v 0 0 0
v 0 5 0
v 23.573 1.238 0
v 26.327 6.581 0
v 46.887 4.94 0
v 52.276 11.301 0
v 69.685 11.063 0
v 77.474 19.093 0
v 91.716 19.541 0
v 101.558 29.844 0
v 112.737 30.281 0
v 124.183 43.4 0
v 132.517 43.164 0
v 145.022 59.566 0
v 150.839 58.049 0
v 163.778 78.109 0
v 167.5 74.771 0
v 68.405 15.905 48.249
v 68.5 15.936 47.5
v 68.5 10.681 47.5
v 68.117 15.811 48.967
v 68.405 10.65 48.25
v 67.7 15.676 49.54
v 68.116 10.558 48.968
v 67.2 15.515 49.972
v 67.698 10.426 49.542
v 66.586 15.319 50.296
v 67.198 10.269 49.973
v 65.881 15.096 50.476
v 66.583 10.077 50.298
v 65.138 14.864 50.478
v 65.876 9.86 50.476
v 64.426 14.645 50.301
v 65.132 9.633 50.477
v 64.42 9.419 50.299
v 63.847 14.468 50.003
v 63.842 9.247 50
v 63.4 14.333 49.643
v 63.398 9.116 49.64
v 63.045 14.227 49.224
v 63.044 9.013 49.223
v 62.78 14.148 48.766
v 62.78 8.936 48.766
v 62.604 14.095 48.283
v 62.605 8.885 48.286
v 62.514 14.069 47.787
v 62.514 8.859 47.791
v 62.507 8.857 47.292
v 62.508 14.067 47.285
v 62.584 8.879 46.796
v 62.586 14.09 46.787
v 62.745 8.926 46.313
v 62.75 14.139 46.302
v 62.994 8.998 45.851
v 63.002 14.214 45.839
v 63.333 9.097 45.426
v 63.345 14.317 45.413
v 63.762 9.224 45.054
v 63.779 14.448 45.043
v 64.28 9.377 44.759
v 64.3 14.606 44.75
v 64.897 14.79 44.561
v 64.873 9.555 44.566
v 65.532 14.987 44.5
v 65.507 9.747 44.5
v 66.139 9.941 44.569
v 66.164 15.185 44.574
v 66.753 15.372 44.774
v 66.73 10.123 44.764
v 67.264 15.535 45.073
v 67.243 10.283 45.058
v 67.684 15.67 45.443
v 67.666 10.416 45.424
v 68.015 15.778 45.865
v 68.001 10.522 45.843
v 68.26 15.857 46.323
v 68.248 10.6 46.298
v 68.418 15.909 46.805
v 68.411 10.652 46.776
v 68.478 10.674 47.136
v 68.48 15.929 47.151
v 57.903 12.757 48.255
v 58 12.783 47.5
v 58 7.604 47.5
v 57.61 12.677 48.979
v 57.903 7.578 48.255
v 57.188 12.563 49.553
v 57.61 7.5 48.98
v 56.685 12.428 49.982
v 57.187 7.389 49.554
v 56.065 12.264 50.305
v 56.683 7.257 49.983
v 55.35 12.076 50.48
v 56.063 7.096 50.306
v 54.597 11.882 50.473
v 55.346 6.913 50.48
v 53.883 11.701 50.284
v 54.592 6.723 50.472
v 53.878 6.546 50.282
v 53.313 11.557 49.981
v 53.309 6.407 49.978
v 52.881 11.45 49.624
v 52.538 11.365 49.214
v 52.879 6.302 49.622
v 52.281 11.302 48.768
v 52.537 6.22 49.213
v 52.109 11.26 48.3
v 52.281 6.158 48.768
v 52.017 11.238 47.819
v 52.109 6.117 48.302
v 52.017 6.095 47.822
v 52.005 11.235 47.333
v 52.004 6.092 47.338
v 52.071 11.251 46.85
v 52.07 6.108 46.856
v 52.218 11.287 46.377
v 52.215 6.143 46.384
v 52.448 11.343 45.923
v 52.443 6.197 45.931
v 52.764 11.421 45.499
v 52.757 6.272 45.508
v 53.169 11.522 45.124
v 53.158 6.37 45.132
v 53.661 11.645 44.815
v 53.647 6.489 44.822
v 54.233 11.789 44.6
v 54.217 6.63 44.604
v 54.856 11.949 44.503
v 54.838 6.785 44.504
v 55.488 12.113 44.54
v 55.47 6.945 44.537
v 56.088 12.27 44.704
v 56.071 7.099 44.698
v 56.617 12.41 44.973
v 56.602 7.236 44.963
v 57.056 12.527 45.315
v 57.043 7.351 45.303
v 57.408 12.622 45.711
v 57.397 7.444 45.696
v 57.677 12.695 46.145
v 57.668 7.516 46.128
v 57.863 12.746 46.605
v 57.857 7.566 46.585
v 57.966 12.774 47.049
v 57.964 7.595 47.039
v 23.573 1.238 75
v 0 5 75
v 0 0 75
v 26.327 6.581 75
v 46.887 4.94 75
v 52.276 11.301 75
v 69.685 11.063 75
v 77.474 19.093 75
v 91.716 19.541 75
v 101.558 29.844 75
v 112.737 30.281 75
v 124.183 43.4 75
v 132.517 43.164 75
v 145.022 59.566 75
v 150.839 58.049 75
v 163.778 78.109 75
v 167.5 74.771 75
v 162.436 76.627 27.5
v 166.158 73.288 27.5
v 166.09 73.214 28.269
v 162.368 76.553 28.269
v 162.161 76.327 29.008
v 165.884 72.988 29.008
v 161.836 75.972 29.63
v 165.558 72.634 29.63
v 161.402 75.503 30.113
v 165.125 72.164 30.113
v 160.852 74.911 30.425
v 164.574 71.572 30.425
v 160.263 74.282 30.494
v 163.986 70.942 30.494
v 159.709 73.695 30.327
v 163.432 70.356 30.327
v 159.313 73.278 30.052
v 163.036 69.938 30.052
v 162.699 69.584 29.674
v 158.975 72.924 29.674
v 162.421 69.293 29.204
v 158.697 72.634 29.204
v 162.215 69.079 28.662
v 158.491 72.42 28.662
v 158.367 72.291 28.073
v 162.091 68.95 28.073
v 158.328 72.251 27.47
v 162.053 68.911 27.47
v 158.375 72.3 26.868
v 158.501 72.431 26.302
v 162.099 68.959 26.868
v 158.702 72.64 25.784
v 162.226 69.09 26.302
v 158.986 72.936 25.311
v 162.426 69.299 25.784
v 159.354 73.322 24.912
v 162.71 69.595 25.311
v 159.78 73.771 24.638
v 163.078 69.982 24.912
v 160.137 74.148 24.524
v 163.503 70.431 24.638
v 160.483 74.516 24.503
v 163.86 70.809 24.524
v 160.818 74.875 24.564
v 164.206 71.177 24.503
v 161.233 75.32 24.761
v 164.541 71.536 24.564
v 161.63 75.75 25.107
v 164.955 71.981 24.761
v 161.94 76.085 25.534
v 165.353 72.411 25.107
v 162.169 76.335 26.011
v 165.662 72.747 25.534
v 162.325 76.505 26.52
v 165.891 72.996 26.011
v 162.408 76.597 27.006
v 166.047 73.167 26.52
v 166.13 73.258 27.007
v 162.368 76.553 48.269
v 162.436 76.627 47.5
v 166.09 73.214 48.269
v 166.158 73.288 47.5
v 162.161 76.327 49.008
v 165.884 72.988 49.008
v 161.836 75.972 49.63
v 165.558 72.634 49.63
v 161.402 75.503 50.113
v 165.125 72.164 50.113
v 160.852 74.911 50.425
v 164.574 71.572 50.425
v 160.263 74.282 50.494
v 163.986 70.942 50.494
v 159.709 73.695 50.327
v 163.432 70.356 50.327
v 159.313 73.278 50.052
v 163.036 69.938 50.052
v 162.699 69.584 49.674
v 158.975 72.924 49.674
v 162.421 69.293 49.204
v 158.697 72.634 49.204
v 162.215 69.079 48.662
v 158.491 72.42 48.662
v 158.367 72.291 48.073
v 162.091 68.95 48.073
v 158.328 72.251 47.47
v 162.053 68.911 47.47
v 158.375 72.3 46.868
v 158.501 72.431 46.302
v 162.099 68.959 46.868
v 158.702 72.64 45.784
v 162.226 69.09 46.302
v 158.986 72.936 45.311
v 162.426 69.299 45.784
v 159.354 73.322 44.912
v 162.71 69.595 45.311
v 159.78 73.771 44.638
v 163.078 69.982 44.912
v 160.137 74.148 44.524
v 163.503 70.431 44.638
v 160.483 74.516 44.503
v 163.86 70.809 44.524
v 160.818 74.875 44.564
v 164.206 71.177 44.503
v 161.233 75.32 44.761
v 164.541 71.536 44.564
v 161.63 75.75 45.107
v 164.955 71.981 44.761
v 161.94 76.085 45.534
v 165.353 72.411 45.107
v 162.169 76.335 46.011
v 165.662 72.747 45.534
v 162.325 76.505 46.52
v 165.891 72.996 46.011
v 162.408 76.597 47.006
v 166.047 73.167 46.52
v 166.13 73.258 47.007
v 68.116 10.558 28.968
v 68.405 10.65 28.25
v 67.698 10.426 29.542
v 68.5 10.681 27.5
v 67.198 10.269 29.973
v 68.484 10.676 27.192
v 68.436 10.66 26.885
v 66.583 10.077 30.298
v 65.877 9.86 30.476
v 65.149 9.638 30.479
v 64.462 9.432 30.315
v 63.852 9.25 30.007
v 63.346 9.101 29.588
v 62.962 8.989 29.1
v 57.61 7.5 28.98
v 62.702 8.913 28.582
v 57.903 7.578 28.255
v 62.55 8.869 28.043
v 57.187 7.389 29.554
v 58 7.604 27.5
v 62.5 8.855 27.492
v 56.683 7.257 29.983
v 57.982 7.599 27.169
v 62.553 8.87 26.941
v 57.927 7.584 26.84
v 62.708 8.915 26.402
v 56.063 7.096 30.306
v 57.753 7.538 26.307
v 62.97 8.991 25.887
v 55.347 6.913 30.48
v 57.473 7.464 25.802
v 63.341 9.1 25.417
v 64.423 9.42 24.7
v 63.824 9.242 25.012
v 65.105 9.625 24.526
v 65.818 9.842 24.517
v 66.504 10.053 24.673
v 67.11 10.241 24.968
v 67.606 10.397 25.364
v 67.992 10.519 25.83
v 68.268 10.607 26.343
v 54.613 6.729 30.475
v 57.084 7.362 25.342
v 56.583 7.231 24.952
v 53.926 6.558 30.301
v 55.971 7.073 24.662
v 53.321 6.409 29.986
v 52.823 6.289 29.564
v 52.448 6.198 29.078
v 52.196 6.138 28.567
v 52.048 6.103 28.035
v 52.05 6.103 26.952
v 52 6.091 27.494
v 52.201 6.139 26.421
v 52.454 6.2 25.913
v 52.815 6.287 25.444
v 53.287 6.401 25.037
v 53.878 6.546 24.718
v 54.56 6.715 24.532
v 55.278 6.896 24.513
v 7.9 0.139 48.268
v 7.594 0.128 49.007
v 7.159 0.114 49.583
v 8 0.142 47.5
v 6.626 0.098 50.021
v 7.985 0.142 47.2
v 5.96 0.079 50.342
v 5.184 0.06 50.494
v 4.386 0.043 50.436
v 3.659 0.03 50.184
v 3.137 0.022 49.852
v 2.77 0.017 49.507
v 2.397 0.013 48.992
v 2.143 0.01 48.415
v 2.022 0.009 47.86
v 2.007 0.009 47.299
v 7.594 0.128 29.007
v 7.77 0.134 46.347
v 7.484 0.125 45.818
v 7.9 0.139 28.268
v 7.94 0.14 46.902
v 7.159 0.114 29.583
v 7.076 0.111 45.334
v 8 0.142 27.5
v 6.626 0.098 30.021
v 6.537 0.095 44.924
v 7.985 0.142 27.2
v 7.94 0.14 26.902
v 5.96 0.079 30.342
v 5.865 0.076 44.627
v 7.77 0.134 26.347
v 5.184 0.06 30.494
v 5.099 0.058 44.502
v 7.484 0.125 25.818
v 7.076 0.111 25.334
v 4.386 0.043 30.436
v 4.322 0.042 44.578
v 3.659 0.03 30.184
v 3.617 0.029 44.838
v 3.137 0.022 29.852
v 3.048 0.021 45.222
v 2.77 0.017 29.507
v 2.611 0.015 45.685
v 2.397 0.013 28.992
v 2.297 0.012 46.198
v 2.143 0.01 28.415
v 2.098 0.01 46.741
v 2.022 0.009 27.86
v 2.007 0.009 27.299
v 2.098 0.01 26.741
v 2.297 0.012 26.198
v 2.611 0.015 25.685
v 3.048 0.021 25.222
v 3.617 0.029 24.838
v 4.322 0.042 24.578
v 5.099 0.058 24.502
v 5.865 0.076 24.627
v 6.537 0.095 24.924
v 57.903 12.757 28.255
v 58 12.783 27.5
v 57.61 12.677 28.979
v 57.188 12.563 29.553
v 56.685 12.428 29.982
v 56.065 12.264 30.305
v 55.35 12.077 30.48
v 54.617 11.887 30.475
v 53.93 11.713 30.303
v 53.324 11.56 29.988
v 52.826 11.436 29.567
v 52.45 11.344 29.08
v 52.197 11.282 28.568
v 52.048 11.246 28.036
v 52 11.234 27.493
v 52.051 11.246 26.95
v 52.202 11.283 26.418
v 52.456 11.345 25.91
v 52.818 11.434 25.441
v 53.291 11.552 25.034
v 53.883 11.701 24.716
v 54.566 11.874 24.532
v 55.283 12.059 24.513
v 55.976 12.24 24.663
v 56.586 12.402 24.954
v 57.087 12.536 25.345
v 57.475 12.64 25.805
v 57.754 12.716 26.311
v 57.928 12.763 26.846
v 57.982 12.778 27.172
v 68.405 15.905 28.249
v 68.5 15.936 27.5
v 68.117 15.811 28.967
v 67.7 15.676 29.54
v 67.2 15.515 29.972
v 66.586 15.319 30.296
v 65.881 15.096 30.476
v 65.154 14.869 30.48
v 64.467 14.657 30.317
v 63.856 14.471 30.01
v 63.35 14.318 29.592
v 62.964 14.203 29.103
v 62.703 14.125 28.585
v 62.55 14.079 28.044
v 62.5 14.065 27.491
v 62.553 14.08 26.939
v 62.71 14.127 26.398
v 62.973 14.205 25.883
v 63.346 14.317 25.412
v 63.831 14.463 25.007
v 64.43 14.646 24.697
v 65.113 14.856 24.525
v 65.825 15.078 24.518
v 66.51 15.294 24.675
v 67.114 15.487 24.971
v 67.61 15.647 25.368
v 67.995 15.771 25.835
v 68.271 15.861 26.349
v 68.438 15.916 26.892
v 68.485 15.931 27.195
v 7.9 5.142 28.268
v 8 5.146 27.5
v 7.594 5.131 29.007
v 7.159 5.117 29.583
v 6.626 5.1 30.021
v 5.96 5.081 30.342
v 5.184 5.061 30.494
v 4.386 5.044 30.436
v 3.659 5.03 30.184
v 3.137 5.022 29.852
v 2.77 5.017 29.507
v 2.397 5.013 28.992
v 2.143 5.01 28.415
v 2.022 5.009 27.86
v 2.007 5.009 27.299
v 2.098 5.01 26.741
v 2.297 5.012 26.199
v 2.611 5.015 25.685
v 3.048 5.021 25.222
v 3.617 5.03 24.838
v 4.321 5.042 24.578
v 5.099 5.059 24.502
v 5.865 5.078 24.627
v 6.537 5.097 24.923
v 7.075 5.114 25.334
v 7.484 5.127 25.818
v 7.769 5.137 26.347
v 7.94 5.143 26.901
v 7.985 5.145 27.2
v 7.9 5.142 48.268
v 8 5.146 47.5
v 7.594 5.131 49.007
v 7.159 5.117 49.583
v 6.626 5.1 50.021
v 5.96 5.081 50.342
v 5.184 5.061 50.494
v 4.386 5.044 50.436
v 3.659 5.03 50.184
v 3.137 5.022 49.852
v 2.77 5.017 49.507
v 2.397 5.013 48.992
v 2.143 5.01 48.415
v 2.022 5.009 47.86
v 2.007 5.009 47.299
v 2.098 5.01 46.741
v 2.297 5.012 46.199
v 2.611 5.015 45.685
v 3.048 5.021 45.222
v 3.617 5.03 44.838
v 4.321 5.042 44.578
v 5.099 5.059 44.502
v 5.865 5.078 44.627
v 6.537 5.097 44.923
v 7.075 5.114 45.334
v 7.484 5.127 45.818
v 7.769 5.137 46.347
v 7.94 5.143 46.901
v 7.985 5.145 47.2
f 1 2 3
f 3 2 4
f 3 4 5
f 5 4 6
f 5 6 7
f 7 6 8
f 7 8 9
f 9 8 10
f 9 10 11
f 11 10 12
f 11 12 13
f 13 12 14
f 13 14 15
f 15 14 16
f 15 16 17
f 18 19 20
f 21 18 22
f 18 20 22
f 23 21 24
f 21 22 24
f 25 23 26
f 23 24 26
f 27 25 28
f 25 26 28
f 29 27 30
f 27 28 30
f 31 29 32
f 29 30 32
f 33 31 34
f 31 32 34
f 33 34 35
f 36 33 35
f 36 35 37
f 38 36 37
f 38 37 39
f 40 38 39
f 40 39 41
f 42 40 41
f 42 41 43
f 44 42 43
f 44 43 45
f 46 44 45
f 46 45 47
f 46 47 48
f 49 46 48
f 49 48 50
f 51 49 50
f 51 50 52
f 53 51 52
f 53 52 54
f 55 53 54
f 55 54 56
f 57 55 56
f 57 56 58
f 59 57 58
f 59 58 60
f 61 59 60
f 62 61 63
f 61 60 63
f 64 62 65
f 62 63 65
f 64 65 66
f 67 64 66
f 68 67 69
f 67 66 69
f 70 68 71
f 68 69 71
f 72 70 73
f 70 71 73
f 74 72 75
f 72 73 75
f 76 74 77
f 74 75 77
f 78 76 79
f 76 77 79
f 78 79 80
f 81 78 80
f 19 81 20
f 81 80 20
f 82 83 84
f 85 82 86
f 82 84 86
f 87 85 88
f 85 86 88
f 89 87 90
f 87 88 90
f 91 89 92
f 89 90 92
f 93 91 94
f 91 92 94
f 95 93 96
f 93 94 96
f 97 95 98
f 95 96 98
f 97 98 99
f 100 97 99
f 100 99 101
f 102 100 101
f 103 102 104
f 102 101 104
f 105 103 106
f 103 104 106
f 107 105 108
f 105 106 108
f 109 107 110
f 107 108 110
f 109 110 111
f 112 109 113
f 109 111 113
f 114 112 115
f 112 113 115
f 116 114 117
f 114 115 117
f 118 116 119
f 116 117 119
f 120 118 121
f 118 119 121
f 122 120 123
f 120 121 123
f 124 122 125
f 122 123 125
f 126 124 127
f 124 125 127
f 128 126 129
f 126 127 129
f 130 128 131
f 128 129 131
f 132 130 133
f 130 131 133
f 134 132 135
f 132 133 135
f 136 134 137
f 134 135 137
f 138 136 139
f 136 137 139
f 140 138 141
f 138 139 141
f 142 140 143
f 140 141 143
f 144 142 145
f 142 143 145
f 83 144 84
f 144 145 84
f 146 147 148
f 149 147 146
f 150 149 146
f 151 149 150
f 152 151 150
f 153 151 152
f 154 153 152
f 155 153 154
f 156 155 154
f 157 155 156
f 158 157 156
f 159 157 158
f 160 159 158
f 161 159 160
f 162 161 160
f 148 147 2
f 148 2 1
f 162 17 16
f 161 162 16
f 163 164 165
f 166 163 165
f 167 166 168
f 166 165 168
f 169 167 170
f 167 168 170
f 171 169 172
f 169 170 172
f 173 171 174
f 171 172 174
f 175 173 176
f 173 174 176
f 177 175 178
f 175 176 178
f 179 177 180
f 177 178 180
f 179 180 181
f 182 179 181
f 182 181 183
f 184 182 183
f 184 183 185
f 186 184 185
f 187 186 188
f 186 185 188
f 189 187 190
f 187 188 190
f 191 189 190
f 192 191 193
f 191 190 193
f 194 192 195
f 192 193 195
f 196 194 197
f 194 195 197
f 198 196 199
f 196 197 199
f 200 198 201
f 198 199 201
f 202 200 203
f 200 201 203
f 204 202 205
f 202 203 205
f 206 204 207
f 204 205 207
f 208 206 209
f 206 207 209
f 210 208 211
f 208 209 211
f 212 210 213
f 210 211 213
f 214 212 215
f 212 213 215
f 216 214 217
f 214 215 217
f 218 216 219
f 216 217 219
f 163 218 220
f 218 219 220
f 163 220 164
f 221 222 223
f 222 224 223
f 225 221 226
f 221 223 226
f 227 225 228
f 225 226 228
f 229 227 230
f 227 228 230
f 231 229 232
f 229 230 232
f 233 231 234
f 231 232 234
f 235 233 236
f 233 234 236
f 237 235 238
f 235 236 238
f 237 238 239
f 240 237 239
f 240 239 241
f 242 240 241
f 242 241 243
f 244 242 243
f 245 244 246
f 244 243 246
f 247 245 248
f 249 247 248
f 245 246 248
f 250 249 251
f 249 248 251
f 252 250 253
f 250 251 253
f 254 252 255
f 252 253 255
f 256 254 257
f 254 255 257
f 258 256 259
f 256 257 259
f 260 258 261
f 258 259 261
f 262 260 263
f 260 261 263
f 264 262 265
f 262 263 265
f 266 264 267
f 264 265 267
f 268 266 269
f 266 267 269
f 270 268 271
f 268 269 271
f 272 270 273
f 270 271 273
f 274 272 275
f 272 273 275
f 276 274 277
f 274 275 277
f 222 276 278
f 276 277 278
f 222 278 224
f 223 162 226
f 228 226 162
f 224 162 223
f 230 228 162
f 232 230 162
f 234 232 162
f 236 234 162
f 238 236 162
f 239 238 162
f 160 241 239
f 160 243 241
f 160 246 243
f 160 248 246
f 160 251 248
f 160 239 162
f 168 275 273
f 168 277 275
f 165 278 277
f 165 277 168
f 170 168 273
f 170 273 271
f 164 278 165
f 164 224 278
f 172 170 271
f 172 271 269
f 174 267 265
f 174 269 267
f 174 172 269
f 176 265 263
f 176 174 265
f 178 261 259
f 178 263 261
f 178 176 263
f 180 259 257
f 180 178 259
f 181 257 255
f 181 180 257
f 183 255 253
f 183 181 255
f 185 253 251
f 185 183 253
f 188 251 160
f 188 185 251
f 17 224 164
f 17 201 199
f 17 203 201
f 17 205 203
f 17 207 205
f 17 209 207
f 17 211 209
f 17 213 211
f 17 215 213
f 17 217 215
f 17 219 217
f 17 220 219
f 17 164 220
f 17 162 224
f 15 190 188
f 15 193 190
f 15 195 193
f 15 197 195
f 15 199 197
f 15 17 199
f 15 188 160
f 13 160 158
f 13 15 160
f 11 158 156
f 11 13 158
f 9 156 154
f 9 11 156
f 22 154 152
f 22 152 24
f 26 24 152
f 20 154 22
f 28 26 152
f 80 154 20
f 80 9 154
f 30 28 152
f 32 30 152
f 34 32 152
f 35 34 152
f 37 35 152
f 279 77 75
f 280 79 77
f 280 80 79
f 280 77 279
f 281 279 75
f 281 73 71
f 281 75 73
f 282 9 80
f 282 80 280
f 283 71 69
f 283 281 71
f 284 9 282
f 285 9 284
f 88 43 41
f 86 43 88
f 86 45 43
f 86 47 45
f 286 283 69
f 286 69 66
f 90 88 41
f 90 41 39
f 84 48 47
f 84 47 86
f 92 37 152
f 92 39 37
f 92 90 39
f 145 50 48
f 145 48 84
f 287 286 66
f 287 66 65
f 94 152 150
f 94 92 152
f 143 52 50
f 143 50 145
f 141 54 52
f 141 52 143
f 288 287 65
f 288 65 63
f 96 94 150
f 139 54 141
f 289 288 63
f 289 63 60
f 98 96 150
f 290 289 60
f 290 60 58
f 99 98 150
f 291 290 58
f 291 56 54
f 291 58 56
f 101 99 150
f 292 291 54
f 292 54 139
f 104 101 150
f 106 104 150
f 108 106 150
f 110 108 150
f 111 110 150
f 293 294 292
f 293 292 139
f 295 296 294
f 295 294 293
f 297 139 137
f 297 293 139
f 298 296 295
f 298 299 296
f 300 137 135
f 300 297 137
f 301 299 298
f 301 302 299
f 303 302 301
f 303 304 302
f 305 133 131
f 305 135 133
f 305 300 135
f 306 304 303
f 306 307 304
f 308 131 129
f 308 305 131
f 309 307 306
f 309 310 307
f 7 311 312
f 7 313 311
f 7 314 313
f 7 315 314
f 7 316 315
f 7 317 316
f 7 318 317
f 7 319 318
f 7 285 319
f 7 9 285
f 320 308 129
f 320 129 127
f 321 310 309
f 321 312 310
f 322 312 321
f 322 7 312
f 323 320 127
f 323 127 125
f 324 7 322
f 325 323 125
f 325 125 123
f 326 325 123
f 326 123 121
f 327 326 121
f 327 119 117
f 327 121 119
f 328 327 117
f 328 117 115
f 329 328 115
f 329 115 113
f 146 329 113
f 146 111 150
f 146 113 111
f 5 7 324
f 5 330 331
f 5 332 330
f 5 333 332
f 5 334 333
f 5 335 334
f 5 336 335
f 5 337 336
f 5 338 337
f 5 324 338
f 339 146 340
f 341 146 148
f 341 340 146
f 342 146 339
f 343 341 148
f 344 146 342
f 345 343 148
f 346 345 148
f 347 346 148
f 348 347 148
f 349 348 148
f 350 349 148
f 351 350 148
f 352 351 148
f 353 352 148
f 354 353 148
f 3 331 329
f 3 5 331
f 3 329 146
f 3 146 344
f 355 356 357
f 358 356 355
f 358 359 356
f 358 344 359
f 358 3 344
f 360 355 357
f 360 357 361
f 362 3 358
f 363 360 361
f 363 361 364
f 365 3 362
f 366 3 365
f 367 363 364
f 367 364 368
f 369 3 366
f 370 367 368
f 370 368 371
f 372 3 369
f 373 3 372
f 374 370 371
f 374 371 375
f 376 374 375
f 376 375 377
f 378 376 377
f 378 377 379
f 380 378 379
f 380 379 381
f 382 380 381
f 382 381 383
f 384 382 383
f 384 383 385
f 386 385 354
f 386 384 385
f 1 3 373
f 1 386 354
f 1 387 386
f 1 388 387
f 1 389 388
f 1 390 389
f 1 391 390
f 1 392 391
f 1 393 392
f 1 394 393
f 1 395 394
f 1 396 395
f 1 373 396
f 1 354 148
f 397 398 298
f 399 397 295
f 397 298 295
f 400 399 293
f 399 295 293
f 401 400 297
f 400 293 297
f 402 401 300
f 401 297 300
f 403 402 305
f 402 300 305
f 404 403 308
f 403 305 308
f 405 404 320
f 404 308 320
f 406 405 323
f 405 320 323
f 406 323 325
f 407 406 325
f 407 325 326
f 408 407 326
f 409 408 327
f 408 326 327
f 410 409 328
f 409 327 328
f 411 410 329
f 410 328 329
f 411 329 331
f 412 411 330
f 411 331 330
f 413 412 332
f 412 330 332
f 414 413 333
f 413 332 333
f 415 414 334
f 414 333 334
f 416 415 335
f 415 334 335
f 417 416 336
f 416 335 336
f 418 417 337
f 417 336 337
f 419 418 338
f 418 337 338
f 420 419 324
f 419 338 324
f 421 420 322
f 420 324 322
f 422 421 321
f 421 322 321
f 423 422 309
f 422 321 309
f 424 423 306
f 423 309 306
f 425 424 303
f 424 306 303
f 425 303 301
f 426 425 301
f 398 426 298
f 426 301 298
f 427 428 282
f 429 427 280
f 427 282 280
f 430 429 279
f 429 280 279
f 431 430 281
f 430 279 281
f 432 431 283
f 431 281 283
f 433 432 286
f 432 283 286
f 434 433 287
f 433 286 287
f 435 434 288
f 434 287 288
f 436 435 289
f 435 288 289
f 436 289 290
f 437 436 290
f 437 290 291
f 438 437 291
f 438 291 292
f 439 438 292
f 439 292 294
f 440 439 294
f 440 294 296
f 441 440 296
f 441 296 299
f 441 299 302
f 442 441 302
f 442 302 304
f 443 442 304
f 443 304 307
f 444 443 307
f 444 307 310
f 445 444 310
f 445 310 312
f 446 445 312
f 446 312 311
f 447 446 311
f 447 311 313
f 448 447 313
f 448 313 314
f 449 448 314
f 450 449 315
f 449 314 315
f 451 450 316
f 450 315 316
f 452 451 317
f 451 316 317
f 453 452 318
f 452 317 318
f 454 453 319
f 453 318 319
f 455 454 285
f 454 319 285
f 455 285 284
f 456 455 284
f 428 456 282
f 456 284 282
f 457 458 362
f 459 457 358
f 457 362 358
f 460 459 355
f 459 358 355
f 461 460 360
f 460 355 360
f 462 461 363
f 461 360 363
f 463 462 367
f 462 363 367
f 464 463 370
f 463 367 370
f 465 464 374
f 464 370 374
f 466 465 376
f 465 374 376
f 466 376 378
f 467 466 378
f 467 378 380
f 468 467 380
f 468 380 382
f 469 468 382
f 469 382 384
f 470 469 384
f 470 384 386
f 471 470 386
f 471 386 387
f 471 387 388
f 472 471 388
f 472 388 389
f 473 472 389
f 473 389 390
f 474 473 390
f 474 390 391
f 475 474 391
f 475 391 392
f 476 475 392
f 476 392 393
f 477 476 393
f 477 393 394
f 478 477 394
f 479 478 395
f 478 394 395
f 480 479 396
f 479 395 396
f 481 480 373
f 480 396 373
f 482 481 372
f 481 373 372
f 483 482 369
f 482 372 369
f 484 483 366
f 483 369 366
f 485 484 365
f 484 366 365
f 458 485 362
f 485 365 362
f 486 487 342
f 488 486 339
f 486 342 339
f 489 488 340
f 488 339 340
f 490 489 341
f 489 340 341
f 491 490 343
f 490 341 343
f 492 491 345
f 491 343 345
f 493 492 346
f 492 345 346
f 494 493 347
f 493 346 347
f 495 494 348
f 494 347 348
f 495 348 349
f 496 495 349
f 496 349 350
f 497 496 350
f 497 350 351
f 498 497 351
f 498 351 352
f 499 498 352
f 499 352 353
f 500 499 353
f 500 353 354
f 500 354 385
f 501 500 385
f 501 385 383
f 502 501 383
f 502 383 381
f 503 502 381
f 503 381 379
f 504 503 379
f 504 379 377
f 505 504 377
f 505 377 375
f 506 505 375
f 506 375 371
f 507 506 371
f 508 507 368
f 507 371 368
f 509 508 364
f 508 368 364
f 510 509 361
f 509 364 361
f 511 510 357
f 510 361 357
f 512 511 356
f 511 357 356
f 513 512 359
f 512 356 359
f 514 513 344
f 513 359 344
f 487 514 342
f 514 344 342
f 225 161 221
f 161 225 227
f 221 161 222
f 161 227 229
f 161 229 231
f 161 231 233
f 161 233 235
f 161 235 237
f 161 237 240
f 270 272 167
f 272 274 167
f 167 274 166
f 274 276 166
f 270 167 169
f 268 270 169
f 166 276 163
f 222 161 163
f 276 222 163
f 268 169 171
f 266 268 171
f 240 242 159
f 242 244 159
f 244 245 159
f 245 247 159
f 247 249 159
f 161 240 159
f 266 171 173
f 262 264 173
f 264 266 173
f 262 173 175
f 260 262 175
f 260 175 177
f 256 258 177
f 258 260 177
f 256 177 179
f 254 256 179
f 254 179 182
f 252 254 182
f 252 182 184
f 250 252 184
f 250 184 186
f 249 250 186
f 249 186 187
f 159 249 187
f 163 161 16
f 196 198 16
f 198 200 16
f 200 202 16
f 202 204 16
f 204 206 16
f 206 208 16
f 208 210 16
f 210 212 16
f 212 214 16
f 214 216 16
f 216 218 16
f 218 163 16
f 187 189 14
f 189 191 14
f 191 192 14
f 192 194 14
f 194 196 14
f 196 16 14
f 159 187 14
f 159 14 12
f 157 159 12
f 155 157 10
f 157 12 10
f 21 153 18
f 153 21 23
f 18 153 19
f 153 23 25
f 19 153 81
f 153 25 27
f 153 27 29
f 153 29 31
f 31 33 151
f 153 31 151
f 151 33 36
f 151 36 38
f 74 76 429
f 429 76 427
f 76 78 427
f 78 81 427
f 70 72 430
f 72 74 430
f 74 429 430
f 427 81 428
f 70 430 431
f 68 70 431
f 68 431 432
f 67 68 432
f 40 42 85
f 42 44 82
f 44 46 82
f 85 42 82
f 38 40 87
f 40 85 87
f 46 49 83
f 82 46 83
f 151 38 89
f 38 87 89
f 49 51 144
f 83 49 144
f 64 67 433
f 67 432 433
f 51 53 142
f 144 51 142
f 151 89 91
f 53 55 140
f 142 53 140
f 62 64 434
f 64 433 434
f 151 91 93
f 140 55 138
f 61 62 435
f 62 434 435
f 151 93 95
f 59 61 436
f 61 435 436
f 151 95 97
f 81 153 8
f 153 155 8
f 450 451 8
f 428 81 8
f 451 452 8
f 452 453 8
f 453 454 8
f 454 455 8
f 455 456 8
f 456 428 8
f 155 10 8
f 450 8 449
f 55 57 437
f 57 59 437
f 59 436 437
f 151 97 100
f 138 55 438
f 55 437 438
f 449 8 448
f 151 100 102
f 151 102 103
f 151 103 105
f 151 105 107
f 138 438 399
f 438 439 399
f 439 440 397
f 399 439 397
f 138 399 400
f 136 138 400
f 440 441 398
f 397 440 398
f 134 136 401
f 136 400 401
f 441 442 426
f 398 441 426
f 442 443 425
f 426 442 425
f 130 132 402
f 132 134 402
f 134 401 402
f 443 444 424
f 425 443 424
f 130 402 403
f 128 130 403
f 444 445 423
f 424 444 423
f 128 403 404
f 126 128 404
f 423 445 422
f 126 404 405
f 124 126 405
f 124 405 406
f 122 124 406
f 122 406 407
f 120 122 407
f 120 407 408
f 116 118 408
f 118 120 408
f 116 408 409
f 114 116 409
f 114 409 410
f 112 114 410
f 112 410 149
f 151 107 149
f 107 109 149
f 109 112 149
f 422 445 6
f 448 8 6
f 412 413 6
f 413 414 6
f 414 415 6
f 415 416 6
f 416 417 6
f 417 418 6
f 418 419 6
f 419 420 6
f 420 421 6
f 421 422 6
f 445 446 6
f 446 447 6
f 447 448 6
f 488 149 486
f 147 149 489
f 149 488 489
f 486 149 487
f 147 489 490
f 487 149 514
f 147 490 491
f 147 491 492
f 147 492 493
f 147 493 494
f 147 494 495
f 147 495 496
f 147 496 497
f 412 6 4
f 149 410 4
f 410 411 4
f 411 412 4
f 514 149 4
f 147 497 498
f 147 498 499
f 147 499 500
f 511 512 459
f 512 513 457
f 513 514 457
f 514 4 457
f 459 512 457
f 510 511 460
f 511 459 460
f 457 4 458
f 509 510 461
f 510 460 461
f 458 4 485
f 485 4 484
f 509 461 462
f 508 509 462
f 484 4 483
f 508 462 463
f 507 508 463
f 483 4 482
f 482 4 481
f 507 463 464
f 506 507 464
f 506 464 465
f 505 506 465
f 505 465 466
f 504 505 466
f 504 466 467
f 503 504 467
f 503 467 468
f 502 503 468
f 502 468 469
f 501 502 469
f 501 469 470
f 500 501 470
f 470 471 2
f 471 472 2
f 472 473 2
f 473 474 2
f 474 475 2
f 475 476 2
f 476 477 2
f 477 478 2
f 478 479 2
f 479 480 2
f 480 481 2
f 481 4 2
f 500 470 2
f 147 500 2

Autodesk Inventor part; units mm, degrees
ref_plane "YZ Plane" through (0, 0, 0) normal (1, 0, 0) x (0, 1, 0)
sketch "Sketch1" plane through (0, 0, 0) normal (0, 0, 1) x (1, 0, 0)
  circle A0 centre (0, 225) radius 225 construction
  circle A1 centre (0, 225) radius 220 construction
  line L0 (0, 5) -> (0, 0)
  arc A2 (0, 0) -> (167.5, 74.771) centre (0, 225) ccw
  line L1 (167.5, 74.771) -> (163.7778, 78.1094)
  arc A3 (0, 5) -> (163.7778, 78.1094) centre (0, 225) ccw
  dimension "d0" = 450
  dimension "d1" = 5
  dimension "d2" = 5
  dimension "d3" = 167.5
extrude "Extrusion1" add sketch "Sketch1" along normal blind 75
ref_plane "Work Plane1" through (167.5, 74.771, 0) normal (0.7444, -0.6677, 0) x (0.6677, 0.7444, 0)
sketch "Sketch2" plane through (167.5, 74.771, 0) normal (0.7444, -0.6677, 0) x (0.6677, 0.7444, 0)
  circle A0 centre (-5, 47.5) radius 3
  circle A1 centre (-5, 27.5) radius 3
  line L0 (0, 0) -> (-167.5, 0) projected
  line L1 (0, 0) -> (0, 75) projected
  line L2 (-167.5, 75) -> (0, 75) projected
  line L3 (-167.5, 0) -> (-167.5, 75) projected
  dimension "d6" = 6
  dimension "d7" = 6
  dimension "d8" = 5
  dimension "d9" = 27.5
  dimension "d10" = 20
extrude "Extrusion2" cut sketch "Sketch2" along normal through all both and the other way through all contours A0 | A1
ref_plane "Work Plane2" through (0, 0, 0) normal (0, -1, 0) x (1, 0, 0)
sketch "Sketch3" plane through (0, 0, 0) normal (0, -1, 0) x (1, 0, 0)
  circle A0 centre (5, 47.5) radius 3
  circle A1 centre (5, 27.5) radius 3
  circle A2 centre (55, 47.5) radius 3
  circle A3 centre (55, 27.5) radius 3
  circle A4 centre (65.5, 47.5) radius 3
  circle A5 centre (65.5, 27.5) radius 3
  point P0 (0, 0)
  dimension "d13" = 6
  dimension "d14" = 6
  dimension "d15" = 6
  dimension "d16" = 6
  dimension "d17" = 27.5
  dimension "d18" = 20
  dimension "d19" = 5
  dimension "d20" = 55
  dimension "d23" = 6
  dimension "d24" = 6
  dimension "d25" = 10.5
extrude "Extrusion3" cut sketch "Sketch3" along normal through all both and the other way through all
properties part number "CW004" material "ABS Plastic"
